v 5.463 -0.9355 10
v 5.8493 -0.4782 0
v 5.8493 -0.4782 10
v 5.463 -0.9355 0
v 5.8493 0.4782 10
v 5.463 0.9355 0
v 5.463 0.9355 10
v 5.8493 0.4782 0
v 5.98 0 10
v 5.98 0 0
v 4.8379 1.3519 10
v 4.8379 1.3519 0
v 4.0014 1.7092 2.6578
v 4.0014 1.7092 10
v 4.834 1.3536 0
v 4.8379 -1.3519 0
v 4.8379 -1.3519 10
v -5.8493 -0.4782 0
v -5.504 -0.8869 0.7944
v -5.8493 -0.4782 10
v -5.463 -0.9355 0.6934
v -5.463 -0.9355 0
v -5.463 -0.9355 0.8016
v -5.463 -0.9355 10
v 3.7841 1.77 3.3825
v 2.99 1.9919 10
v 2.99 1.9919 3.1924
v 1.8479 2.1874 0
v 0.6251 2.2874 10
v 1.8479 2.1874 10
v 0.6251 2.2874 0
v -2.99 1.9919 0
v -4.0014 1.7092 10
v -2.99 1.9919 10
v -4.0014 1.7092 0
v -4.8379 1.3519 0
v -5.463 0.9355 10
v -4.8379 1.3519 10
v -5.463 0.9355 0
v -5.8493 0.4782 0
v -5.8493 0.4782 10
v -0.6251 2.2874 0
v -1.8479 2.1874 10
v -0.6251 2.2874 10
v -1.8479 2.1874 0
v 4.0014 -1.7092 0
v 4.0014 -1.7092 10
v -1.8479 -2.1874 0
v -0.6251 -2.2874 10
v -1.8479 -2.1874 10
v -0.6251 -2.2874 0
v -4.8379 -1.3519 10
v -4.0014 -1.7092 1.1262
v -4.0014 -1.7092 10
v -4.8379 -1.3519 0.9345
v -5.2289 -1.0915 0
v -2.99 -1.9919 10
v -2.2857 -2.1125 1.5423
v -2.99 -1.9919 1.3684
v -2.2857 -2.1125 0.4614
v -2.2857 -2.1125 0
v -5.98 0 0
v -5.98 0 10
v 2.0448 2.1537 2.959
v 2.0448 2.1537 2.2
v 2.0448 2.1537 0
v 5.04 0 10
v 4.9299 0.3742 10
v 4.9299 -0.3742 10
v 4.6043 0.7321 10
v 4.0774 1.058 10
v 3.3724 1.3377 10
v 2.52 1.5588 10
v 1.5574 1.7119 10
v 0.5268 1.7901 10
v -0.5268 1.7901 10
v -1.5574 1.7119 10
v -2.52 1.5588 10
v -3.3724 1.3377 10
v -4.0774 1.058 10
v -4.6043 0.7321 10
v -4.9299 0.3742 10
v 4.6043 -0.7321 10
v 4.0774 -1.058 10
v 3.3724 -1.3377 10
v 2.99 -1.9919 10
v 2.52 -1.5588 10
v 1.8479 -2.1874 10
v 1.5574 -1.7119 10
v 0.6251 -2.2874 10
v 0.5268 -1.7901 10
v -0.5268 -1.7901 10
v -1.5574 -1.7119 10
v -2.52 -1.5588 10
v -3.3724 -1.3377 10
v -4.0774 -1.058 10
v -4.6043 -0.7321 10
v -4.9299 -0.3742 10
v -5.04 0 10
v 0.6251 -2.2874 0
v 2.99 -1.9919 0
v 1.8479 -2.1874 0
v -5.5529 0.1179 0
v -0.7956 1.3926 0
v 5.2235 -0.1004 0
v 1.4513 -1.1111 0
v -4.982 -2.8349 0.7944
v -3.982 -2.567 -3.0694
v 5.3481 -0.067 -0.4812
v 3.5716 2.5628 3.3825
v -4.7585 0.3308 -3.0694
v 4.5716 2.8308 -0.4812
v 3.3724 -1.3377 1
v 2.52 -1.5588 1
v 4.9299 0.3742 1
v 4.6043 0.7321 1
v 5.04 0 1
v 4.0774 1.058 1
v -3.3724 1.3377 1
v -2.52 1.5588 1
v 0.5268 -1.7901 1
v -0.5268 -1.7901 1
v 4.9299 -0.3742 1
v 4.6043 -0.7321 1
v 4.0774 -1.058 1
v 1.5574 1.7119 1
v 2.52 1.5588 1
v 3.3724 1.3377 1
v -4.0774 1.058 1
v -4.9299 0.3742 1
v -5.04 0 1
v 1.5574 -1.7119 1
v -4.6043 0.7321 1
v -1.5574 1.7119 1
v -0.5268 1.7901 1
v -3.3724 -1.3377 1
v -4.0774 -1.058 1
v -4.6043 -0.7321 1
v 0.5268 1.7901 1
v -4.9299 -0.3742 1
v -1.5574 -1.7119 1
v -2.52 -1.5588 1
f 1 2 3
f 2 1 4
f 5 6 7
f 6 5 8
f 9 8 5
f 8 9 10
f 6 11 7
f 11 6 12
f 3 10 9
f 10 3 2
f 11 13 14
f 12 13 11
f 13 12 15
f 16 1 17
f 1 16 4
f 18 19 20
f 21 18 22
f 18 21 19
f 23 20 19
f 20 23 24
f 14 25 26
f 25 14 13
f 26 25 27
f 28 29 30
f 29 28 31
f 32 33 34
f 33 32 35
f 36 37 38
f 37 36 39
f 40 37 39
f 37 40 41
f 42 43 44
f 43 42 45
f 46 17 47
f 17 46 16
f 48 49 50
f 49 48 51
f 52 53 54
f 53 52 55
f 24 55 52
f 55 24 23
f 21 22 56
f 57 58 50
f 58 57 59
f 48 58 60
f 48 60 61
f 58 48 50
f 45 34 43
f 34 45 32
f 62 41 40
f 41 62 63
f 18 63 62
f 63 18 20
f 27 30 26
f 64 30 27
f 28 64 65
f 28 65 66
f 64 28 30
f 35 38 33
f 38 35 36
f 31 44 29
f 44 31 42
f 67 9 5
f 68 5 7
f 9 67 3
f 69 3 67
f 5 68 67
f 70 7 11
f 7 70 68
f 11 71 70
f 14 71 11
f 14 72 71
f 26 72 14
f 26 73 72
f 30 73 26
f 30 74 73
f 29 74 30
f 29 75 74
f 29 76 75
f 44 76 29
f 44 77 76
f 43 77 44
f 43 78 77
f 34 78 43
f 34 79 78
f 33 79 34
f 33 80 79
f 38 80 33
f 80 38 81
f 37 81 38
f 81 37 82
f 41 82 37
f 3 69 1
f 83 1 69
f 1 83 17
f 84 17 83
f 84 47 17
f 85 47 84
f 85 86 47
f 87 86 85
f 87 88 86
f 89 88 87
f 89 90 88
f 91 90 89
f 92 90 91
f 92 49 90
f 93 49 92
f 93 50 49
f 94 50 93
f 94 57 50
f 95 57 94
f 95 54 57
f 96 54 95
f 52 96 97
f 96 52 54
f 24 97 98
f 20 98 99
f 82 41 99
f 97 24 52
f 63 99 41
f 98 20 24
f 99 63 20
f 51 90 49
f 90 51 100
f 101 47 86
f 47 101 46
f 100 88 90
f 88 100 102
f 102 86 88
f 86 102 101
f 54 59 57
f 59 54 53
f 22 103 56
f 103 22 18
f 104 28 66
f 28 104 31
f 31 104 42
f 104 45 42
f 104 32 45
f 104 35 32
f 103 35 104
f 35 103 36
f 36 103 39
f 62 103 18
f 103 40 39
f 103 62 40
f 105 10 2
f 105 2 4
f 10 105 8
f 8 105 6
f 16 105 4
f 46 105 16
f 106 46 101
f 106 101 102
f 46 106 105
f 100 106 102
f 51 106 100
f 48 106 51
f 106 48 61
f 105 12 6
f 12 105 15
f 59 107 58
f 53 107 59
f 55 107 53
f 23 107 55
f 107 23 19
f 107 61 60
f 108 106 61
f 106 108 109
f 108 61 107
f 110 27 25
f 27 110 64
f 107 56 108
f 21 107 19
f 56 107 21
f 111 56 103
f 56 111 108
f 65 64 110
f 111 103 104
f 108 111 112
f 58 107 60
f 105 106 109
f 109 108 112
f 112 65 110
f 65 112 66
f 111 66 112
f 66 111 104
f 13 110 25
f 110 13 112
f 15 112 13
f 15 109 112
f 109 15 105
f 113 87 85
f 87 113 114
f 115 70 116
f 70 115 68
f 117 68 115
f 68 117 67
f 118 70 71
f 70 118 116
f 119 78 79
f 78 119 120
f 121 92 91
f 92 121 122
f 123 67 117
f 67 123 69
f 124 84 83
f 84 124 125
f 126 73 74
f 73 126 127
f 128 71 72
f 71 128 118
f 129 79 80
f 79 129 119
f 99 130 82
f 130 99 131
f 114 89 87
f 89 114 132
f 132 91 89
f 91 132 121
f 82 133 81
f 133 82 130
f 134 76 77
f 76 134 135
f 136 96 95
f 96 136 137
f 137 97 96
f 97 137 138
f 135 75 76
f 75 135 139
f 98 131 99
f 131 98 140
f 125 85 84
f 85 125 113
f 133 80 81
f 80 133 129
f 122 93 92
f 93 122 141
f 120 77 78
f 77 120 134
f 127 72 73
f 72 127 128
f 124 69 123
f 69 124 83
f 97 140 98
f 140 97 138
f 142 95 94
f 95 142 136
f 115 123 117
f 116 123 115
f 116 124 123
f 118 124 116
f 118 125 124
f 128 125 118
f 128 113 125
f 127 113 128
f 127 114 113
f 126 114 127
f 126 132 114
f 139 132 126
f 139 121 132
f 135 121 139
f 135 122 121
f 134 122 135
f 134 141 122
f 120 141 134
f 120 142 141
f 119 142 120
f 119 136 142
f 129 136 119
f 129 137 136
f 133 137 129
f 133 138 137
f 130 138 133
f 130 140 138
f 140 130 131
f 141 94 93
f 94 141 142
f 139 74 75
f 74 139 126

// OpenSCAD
$fn = 30;

module TPUtip(){
difference(){
    union(){
        scale([2.6,1,1]) cylinder(10,2.3,2.3);
        translate([0,-2+0.5,-3]) rotate([0,0,15]) rotate([0,-15,0]) translate([-4,0,1]) cube([10,3,4]);
    }
    union(){
        //translate([0,0,1]) scale([4,1,1]) cylinder(10,1,1);
        translate([0,0,1]) scale([2.8,1,1]) cylinder(10,1.8,1.8);
        //translate([3,20,4]) rotate([90,0,0]) cylinder(40,1.0,1.0);
        //translate([-3,20,4]) rotate([90,0,0]) cylinder(40,1.0,1.0);
    }
}

}

TPUtip();
